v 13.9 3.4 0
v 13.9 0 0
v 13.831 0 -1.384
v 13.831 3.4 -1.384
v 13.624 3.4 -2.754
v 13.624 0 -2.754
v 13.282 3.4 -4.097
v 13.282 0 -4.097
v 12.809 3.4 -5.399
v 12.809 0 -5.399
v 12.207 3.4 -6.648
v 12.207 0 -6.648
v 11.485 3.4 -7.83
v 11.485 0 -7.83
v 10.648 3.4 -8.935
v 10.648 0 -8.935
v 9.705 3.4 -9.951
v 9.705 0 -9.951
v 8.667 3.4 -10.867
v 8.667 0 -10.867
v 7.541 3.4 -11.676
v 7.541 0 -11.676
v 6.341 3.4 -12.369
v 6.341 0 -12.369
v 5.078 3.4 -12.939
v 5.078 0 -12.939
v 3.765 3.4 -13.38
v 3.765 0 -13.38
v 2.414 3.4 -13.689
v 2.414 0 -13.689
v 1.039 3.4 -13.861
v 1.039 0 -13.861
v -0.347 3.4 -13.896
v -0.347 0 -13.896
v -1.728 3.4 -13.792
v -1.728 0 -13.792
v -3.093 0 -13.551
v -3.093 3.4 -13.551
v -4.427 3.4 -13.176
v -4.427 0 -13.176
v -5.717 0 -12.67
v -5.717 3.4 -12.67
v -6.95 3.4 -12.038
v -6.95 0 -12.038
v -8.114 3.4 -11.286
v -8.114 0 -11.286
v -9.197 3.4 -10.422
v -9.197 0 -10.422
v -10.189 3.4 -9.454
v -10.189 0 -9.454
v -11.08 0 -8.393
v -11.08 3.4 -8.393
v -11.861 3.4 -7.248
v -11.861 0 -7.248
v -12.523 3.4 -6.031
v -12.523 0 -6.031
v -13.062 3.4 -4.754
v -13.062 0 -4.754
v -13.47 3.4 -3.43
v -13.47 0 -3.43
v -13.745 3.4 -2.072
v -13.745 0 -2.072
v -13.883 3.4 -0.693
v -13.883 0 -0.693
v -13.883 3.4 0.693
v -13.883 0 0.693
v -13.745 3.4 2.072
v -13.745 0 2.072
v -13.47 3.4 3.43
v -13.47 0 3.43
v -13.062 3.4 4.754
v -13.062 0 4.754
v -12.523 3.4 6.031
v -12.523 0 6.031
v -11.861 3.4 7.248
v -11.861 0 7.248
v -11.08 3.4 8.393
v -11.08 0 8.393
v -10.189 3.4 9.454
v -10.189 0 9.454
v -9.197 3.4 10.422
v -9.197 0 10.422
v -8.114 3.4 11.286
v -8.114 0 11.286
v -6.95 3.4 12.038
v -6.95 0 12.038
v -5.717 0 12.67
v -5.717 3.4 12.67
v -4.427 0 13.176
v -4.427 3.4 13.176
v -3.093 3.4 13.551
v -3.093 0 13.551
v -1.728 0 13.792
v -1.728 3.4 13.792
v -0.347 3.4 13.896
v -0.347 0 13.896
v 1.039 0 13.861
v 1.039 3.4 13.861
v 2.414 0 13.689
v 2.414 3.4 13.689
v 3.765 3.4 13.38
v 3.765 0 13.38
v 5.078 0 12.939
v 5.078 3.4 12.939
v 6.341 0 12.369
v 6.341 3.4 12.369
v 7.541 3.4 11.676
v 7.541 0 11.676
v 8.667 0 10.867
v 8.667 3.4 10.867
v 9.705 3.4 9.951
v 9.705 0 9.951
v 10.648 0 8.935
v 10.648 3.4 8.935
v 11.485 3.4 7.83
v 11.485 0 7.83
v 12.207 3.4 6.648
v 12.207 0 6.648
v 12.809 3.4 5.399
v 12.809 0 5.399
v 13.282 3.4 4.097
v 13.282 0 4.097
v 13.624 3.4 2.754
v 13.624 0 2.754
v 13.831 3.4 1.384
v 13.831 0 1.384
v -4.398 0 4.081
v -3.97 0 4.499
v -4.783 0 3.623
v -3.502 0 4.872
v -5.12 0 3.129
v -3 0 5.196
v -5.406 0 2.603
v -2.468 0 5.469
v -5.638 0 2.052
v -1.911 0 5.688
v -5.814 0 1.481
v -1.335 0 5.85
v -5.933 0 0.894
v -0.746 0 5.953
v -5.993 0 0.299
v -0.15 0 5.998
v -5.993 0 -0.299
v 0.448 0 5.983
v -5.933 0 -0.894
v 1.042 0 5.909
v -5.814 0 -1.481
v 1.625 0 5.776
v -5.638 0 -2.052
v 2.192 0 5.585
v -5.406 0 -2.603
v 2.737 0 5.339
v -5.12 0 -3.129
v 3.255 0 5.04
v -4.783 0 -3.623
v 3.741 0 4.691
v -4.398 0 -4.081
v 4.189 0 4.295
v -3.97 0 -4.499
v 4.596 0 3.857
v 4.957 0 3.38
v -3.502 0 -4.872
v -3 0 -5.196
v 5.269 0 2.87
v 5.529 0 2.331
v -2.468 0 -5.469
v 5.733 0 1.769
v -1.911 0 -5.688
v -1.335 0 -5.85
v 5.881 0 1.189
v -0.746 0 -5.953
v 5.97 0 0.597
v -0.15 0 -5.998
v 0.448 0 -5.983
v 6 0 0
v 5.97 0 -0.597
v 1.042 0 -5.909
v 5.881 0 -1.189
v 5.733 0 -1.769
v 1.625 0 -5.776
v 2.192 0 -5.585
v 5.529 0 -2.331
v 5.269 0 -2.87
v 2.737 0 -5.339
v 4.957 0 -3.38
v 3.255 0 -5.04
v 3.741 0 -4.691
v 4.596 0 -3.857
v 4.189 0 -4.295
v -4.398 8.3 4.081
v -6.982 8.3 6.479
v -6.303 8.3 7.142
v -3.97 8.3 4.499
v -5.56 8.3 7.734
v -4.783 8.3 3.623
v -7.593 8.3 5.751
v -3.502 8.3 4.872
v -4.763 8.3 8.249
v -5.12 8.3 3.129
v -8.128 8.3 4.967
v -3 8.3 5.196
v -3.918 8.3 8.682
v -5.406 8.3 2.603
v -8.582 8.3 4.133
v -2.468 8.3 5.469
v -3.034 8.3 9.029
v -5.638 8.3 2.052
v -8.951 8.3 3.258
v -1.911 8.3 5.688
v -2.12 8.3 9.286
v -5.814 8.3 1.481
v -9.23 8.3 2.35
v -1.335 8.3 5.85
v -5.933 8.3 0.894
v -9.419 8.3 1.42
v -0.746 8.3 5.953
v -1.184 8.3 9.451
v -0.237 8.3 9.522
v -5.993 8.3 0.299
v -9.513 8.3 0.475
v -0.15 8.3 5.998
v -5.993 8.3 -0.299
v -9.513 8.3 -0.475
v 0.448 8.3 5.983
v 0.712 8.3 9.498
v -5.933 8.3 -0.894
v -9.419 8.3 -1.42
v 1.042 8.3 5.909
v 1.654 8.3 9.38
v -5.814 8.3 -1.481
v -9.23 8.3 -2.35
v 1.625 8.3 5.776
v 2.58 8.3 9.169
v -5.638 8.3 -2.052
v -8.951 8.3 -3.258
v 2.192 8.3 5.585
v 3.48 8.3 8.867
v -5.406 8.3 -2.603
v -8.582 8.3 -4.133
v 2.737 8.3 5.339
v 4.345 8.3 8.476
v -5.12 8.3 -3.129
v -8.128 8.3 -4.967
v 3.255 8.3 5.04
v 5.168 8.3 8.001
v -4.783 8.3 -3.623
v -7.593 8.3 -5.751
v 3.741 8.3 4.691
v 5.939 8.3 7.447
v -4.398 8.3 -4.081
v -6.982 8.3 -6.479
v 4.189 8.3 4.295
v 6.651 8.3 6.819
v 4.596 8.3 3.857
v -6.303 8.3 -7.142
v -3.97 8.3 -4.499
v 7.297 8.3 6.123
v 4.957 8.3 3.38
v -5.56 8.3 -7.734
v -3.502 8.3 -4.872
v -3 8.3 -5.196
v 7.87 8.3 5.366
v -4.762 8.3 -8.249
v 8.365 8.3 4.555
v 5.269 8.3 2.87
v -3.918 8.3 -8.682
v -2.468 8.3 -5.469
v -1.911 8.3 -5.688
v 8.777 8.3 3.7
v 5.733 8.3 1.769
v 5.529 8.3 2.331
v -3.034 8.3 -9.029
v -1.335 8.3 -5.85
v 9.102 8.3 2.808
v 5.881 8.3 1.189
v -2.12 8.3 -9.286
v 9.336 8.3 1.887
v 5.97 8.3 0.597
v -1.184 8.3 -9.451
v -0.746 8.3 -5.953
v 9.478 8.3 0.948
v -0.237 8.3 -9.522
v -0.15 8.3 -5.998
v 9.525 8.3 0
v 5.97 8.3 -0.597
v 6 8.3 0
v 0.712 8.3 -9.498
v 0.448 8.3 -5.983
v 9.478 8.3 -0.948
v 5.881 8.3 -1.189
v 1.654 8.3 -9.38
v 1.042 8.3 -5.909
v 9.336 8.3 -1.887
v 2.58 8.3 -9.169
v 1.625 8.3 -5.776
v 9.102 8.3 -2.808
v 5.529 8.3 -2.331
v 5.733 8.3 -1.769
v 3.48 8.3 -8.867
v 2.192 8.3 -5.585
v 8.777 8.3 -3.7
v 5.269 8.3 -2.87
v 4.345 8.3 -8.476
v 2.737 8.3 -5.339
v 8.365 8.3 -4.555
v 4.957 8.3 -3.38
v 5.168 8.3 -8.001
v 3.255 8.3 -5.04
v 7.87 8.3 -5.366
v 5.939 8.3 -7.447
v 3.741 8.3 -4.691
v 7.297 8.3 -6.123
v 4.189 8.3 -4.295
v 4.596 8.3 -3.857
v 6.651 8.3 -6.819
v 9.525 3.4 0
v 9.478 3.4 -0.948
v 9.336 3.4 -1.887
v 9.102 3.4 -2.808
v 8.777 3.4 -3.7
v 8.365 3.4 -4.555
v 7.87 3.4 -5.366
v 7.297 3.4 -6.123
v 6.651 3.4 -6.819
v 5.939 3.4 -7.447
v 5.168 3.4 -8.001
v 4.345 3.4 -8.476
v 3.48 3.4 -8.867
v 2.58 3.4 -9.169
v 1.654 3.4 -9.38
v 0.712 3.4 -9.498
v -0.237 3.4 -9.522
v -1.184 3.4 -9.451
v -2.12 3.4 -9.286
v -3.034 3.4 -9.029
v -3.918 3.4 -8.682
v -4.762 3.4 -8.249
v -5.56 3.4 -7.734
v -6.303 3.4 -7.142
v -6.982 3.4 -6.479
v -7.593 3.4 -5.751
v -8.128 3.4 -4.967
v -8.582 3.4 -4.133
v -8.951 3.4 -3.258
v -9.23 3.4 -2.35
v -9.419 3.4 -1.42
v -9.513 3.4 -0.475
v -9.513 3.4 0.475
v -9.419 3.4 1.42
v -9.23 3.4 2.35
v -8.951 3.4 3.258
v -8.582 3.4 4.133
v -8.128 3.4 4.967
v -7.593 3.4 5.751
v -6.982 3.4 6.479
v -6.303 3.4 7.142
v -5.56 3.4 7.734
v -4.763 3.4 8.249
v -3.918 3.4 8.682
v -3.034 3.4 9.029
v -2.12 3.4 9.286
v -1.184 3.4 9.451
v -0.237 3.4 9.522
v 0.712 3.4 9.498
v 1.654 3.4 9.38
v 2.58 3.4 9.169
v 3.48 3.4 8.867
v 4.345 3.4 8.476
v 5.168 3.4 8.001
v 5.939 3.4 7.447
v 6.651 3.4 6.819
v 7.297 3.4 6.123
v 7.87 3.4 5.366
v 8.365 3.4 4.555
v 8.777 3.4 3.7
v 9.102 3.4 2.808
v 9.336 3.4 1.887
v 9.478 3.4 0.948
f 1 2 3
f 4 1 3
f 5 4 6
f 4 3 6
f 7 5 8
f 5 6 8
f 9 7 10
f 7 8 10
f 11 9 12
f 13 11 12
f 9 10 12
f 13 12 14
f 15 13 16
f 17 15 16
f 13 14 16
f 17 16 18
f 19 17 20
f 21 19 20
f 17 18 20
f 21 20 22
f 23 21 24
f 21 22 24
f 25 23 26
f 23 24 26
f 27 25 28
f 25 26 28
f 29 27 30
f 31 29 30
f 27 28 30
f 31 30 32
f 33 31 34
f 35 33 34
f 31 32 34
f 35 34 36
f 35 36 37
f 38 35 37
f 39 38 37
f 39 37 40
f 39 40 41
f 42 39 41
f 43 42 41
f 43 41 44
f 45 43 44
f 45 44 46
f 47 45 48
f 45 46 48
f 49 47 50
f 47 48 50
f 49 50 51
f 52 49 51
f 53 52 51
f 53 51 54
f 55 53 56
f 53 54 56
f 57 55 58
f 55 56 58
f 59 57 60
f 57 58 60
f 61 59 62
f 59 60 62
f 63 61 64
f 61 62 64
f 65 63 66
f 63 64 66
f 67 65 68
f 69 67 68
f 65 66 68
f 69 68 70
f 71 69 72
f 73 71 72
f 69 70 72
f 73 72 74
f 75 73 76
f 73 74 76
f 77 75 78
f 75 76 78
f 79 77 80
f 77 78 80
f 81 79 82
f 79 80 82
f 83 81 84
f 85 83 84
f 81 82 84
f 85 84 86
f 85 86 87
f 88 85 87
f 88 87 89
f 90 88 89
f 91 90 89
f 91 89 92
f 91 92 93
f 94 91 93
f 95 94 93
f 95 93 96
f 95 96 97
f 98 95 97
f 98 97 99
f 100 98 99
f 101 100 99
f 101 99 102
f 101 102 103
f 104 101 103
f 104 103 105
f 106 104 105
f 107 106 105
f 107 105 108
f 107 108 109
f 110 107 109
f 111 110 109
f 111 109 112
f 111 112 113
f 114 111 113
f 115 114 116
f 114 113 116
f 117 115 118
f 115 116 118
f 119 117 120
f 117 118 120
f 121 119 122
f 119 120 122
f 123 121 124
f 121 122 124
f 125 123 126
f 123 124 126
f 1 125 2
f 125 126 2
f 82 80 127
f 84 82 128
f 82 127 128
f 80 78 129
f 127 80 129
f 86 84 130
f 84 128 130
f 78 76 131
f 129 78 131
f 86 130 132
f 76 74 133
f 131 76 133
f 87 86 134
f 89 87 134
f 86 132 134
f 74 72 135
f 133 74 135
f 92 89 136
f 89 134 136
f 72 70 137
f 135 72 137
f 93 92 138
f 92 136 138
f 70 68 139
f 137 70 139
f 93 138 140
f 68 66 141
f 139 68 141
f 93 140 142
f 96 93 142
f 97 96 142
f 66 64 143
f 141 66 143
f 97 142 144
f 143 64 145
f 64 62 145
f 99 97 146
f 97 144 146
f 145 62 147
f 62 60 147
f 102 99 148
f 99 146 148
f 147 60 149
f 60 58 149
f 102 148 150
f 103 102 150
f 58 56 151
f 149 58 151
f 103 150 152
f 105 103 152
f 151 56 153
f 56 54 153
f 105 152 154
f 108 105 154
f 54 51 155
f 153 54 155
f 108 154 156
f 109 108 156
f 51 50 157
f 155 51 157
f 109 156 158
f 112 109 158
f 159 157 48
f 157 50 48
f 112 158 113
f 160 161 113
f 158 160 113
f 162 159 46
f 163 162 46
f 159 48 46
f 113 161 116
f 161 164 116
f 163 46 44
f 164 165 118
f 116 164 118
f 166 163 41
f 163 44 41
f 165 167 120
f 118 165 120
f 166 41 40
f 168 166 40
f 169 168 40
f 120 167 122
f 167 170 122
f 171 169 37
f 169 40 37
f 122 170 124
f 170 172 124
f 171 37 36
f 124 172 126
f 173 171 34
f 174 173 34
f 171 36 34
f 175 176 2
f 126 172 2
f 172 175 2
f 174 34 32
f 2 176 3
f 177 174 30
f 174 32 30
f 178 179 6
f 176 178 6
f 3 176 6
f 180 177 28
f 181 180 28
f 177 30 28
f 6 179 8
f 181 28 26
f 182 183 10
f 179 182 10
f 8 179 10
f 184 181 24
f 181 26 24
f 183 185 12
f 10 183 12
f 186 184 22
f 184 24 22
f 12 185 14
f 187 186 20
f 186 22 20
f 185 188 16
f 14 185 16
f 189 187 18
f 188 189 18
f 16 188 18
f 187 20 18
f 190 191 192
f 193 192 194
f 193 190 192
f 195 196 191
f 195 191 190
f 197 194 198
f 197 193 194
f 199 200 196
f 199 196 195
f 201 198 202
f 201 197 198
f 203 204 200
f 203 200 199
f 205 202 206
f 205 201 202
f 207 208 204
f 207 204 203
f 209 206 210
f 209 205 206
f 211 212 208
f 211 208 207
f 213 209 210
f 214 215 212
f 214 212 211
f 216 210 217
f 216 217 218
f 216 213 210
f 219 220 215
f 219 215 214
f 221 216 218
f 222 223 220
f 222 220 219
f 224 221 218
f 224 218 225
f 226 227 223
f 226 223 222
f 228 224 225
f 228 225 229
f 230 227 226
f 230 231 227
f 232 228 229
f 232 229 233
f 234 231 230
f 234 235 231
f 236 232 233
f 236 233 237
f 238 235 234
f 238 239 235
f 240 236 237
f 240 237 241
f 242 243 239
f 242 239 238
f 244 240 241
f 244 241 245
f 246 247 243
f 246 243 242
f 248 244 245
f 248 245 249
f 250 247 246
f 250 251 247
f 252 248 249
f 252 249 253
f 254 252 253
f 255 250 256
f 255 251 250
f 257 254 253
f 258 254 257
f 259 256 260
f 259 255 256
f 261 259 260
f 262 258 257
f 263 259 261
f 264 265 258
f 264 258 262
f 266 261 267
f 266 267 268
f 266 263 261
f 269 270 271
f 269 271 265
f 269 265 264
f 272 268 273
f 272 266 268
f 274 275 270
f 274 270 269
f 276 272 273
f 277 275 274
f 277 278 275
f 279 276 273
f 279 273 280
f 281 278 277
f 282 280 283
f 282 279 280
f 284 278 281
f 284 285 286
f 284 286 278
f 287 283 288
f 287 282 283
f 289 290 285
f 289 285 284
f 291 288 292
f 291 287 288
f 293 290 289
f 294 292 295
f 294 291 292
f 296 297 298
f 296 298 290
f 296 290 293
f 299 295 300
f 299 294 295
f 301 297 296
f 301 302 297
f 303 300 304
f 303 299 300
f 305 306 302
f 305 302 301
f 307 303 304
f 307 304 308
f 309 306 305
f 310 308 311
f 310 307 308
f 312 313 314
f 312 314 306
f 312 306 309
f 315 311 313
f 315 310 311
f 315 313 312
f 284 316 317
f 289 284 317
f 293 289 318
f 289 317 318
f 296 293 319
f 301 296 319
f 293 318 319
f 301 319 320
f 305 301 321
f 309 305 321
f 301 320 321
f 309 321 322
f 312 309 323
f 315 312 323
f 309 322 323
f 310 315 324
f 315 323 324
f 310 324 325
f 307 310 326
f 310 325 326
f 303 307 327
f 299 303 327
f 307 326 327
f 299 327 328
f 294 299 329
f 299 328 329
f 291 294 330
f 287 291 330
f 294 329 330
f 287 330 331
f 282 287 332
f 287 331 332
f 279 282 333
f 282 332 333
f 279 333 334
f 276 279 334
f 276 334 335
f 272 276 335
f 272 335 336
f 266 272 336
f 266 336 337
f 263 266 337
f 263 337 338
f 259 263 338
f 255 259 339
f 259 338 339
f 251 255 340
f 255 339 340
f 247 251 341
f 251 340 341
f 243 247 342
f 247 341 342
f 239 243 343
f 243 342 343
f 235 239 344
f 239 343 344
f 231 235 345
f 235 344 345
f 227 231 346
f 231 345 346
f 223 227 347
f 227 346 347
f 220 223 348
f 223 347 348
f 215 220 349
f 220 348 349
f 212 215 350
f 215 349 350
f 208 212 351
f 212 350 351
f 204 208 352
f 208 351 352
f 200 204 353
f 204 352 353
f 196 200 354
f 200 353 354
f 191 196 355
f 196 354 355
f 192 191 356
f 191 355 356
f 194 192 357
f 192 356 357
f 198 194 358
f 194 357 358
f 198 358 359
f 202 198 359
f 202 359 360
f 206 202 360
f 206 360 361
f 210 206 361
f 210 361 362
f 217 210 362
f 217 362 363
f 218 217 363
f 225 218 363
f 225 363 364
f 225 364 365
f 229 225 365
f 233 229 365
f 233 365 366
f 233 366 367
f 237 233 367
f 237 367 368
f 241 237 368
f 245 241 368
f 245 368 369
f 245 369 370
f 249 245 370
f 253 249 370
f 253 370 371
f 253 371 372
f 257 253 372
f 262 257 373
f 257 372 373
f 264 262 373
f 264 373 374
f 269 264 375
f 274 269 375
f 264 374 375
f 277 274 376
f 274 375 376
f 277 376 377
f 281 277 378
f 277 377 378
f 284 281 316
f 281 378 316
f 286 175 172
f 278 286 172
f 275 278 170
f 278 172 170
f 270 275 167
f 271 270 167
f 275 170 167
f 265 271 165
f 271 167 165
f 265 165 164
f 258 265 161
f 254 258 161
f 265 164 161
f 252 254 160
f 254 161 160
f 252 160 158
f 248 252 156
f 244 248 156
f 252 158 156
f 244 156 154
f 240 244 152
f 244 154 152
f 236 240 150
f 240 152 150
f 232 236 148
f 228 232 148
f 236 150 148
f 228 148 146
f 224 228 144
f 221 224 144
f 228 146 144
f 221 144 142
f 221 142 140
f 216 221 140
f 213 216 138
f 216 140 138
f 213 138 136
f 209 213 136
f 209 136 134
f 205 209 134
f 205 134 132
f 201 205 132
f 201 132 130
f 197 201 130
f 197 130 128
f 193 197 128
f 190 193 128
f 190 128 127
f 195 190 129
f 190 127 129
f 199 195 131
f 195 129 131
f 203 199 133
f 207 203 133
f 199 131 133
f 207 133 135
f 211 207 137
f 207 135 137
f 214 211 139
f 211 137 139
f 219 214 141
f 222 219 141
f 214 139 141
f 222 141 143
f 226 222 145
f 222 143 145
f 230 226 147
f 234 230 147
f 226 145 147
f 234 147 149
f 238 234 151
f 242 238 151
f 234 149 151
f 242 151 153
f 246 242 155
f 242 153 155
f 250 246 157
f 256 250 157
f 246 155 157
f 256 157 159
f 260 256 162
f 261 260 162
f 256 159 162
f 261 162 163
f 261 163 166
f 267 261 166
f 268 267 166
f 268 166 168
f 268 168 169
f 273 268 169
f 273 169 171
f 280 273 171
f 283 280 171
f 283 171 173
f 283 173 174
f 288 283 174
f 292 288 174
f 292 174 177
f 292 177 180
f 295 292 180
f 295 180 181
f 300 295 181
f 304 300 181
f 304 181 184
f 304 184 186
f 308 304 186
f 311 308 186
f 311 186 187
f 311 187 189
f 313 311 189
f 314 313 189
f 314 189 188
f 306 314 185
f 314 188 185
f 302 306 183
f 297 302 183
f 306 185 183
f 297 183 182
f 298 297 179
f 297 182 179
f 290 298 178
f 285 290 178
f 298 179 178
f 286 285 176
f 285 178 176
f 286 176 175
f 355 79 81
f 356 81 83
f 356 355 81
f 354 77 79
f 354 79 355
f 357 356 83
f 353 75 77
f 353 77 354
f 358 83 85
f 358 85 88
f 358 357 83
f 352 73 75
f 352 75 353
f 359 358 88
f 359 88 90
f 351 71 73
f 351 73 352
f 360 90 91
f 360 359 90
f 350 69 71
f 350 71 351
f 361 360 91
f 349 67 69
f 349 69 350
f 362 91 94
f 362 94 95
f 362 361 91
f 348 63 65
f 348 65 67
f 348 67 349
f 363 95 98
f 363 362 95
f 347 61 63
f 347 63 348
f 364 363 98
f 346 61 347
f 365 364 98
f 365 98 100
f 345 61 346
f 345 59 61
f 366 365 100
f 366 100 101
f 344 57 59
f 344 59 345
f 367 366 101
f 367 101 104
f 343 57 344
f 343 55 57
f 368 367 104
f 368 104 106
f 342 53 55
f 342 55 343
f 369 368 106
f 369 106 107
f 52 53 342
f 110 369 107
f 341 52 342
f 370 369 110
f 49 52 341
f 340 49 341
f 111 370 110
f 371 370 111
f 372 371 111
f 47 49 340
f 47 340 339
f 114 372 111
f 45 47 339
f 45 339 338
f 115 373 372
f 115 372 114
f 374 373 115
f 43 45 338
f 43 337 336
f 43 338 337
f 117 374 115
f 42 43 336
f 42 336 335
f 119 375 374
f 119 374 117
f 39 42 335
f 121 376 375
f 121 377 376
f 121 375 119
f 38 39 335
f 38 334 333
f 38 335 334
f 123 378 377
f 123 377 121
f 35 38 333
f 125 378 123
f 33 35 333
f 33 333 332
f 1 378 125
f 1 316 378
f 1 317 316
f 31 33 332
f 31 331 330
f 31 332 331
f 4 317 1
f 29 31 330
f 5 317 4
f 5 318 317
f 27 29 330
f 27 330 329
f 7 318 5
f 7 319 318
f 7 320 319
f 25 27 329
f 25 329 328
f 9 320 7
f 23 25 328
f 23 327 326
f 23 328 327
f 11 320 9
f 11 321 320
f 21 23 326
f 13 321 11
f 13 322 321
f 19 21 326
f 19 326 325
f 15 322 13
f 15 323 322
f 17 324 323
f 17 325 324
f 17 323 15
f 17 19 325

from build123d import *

# Parameters (mm, degrees)
SKETCH1_R           = 13.9
BOSS_EXTRUDE1_DEPTH = 3.4
SKETCH2_R           = 9.525
BOSS_EXTRUDE2_DEPTH = 4.9
SKETCH3_R           = 6
CUT_EXTRUDE1_DEPTH  = 8.3


with BuildPart() as part:
    # Sketch1 → Boss-Extrude1 (new body)
    with BuildSketch(Plane(origin=(0, 0, 0), x_dir=(1, 0, 0), z_dir=(0, 1, 0))):
        Circle(SKETCH1_R)
    extrude(amount=BOSS_EXTRUDE1_DEPTH)

    # Sketch2 → Boss-Extrude2 (add)
    with BuildSketch(Plane(origin=(0, 3.4, 0), x_dir=(1, 0, 0), z_dir=(0, 1, 0))):
        Circle(SKETCH2_R)
    extrude(amount=BOSS_EXTRUDE2_DEPTH)

    # Sketch3 → Cut-Extrude1 (cut)
    with BuildSketch(Plane.XZ):
        Circle(SKETCH3_R)
    extrude(amount=-CUT_EXTRUDE1_DEPTH, mode=Mode.SUBTRACT)


solid = part.part
